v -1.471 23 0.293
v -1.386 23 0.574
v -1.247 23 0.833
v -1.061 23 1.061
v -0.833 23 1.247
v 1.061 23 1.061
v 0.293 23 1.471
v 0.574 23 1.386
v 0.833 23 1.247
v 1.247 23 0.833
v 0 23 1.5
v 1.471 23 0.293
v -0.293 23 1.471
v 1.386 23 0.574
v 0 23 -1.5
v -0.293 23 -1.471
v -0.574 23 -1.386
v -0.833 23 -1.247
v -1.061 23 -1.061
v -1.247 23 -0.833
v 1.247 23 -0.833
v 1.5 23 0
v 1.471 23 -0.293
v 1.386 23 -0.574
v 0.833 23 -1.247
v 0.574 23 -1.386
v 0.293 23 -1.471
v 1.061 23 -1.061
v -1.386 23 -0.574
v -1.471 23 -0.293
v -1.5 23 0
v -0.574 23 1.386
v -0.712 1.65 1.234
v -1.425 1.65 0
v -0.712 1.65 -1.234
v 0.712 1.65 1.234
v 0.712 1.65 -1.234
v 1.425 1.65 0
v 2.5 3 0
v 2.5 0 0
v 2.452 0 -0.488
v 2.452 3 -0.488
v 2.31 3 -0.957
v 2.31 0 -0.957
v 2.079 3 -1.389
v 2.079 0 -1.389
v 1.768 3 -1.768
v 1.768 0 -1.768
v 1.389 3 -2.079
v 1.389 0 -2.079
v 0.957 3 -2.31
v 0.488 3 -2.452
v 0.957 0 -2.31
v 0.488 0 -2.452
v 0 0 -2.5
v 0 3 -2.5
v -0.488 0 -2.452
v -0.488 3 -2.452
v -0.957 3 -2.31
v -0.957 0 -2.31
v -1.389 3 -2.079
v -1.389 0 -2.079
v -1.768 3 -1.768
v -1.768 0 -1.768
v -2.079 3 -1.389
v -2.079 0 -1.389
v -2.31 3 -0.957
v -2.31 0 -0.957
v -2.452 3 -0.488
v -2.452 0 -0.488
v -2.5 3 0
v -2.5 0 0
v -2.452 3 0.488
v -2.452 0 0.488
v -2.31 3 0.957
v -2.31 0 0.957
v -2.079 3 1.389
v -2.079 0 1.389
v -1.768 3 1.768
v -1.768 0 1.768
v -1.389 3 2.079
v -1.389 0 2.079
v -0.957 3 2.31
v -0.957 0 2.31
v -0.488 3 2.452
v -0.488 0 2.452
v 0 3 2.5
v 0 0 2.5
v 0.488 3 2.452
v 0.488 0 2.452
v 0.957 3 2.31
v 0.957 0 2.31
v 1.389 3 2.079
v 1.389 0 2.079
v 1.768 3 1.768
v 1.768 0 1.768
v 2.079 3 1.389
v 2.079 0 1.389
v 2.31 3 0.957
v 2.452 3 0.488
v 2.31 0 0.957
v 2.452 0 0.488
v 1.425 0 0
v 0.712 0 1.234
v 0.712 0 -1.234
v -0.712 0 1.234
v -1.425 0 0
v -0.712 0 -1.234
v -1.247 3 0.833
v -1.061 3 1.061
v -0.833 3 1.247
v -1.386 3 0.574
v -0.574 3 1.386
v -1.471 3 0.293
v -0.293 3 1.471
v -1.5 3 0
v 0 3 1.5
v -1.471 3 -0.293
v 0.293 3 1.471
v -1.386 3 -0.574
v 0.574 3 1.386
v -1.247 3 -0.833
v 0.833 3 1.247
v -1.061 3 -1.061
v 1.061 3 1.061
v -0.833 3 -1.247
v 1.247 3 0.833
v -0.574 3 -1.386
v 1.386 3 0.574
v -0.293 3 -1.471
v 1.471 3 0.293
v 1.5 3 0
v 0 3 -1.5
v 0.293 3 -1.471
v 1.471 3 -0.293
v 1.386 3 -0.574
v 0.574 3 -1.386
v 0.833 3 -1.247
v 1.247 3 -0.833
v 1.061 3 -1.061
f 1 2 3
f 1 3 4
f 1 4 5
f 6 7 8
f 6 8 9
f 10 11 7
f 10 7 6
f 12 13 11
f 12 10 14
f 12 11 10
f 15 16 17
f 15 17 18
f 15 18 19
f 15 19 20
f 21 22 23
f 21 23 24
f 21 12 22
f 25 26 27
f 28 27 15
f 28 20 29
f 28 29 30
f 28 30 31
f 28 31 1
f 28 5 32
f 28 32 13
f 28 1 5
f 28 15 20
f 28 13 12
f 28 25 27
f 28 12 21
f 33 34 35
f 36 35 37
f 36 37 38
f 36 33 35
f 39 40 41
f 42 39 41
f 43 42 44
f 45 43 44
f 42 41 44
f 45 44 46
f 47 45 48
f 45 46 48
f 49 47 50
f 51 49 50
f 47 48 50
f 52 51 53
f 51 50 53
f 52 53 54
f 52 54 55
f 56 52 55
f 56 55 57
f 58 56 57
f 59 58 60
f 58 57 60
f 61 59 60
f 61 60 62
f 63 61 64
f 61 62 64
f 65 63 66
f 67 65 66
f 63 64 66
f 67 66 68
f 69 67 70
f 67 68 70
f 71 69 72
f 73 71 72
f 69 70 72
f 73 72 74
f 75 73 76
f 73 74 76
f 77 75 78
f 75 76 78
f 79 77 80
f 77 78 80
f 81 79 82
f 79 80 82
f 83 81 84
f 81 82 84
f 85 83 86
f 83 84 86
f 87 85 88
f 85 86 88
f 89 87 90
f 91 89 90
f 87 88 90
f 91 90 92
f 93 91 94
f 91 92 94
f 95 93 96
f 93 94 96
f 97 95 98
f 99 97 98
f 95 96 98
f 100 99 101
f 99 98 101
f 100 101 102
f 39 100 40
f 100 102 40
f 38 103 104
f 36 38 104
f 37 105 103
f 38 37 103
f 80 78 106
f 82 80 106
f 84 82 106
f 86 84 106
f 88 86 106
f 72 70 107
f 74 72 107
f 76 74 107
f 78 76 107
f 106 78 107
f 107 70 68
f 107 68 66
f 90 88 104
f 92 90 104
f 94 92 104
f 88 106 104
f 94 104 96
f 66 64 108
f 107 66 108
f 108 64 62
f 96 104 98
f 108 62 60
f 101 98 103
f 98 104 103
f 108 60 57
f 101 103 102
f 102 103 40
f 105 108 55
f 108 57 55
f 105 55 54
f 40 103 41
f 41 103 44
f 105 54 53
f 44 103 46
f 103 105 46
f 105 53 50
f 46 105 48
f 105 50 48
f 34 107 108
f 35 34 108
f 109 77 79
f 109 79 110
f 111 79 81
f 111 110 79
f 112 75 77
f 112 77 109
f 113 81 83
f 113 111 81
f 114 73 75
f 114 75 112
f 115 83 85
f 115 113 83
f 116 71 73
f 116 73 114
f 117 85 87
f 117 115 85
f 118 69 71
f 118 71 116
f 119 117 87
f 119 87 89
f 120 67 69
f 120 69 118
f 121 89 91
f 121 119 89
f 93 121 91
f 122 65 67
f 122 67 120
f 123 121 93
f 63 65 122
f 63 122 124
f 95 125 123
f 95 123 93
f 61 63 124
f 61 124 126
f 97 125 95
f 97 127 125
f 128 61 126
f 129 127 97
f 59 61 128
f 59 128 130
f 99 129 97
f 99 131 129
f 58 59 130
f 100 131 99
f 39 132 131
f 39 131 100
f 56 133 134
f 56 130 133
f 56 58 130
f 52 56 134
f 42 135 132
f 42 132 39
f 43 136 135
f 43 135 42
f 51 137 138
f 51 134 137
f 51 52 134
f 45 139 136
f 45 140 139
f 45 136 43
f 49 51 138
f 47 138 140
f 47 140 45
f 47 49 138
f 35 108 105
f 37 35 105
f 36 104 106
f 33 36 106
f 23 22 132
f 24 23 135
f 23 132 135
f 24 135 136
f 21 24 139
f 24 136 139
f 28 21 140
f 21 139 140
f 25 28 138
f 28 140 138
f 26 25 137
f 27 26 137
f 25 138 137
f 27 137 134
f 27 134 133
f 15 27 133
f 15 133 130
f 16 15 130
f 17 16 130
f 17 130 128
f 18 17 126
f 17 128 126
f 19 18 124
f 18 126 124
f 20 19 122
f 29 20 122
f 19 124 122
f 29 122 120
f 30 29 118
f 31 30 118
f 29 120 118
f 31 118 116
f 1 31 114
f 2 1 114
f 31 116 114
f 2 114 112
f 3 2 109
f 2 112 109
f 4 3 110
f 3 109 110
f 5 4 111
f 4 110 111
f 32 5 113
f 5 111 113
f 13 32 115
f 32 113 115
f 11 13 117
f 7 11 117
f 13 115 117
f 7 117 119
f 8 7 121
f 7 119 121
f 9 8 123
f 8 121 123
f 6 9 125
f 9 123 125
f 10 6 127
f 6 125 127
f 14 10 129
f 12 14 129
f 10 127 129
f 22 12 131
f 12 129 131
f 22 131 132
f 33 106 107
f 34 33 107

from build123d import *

# Parameters (mm, degrees)
SKETCH_1_R          = 2.5
EXTRUDE_1_DEPTH     = 3
SKETCH_2_R          = 1.5
EXTRUDE_2_DEPTH     = 20
CUT_EXTRUDE_1_DEPTH = 1.65


with BuildPart() as part:
    # 草图1 → 凸台-拉伸1 (new body)
    with BuildSketch(Plane(origin=(0, 0, 0), x_dir=(1, 0, 0), z_dir=(0, 1, 0))):
        Circle(SKETCH_1_R)
    extrude(amount=EXTRUDE_1_DEPTH)

    # 草图2 → 凸台-拉伸2 (add)
    with BuildSketch(Plane(origin=(0, 3, 0), x_dir=(1, 0, 0), z_dir=(0, 1, 0))):
        Circle(SKETCH_2_R)
    extrude(amount=EXTRUDE_2_DEPTH)

    # 草图3 → 切除-拉伸1 (cut)
    with BuildSketch(Plane.XZ):
        Polygon((1.425, 0), (0.7125, 1.2340862), (-0.7125, 1.2340862), (-1.425, 0), (-0.7125, -1.2340862), (0.7125, -1.2340862), align=None)
    extrude(amount=-CUT_EXTRUDE_1_DEPTH, mode=Mode.SUBTRACT)


solid = part.part
